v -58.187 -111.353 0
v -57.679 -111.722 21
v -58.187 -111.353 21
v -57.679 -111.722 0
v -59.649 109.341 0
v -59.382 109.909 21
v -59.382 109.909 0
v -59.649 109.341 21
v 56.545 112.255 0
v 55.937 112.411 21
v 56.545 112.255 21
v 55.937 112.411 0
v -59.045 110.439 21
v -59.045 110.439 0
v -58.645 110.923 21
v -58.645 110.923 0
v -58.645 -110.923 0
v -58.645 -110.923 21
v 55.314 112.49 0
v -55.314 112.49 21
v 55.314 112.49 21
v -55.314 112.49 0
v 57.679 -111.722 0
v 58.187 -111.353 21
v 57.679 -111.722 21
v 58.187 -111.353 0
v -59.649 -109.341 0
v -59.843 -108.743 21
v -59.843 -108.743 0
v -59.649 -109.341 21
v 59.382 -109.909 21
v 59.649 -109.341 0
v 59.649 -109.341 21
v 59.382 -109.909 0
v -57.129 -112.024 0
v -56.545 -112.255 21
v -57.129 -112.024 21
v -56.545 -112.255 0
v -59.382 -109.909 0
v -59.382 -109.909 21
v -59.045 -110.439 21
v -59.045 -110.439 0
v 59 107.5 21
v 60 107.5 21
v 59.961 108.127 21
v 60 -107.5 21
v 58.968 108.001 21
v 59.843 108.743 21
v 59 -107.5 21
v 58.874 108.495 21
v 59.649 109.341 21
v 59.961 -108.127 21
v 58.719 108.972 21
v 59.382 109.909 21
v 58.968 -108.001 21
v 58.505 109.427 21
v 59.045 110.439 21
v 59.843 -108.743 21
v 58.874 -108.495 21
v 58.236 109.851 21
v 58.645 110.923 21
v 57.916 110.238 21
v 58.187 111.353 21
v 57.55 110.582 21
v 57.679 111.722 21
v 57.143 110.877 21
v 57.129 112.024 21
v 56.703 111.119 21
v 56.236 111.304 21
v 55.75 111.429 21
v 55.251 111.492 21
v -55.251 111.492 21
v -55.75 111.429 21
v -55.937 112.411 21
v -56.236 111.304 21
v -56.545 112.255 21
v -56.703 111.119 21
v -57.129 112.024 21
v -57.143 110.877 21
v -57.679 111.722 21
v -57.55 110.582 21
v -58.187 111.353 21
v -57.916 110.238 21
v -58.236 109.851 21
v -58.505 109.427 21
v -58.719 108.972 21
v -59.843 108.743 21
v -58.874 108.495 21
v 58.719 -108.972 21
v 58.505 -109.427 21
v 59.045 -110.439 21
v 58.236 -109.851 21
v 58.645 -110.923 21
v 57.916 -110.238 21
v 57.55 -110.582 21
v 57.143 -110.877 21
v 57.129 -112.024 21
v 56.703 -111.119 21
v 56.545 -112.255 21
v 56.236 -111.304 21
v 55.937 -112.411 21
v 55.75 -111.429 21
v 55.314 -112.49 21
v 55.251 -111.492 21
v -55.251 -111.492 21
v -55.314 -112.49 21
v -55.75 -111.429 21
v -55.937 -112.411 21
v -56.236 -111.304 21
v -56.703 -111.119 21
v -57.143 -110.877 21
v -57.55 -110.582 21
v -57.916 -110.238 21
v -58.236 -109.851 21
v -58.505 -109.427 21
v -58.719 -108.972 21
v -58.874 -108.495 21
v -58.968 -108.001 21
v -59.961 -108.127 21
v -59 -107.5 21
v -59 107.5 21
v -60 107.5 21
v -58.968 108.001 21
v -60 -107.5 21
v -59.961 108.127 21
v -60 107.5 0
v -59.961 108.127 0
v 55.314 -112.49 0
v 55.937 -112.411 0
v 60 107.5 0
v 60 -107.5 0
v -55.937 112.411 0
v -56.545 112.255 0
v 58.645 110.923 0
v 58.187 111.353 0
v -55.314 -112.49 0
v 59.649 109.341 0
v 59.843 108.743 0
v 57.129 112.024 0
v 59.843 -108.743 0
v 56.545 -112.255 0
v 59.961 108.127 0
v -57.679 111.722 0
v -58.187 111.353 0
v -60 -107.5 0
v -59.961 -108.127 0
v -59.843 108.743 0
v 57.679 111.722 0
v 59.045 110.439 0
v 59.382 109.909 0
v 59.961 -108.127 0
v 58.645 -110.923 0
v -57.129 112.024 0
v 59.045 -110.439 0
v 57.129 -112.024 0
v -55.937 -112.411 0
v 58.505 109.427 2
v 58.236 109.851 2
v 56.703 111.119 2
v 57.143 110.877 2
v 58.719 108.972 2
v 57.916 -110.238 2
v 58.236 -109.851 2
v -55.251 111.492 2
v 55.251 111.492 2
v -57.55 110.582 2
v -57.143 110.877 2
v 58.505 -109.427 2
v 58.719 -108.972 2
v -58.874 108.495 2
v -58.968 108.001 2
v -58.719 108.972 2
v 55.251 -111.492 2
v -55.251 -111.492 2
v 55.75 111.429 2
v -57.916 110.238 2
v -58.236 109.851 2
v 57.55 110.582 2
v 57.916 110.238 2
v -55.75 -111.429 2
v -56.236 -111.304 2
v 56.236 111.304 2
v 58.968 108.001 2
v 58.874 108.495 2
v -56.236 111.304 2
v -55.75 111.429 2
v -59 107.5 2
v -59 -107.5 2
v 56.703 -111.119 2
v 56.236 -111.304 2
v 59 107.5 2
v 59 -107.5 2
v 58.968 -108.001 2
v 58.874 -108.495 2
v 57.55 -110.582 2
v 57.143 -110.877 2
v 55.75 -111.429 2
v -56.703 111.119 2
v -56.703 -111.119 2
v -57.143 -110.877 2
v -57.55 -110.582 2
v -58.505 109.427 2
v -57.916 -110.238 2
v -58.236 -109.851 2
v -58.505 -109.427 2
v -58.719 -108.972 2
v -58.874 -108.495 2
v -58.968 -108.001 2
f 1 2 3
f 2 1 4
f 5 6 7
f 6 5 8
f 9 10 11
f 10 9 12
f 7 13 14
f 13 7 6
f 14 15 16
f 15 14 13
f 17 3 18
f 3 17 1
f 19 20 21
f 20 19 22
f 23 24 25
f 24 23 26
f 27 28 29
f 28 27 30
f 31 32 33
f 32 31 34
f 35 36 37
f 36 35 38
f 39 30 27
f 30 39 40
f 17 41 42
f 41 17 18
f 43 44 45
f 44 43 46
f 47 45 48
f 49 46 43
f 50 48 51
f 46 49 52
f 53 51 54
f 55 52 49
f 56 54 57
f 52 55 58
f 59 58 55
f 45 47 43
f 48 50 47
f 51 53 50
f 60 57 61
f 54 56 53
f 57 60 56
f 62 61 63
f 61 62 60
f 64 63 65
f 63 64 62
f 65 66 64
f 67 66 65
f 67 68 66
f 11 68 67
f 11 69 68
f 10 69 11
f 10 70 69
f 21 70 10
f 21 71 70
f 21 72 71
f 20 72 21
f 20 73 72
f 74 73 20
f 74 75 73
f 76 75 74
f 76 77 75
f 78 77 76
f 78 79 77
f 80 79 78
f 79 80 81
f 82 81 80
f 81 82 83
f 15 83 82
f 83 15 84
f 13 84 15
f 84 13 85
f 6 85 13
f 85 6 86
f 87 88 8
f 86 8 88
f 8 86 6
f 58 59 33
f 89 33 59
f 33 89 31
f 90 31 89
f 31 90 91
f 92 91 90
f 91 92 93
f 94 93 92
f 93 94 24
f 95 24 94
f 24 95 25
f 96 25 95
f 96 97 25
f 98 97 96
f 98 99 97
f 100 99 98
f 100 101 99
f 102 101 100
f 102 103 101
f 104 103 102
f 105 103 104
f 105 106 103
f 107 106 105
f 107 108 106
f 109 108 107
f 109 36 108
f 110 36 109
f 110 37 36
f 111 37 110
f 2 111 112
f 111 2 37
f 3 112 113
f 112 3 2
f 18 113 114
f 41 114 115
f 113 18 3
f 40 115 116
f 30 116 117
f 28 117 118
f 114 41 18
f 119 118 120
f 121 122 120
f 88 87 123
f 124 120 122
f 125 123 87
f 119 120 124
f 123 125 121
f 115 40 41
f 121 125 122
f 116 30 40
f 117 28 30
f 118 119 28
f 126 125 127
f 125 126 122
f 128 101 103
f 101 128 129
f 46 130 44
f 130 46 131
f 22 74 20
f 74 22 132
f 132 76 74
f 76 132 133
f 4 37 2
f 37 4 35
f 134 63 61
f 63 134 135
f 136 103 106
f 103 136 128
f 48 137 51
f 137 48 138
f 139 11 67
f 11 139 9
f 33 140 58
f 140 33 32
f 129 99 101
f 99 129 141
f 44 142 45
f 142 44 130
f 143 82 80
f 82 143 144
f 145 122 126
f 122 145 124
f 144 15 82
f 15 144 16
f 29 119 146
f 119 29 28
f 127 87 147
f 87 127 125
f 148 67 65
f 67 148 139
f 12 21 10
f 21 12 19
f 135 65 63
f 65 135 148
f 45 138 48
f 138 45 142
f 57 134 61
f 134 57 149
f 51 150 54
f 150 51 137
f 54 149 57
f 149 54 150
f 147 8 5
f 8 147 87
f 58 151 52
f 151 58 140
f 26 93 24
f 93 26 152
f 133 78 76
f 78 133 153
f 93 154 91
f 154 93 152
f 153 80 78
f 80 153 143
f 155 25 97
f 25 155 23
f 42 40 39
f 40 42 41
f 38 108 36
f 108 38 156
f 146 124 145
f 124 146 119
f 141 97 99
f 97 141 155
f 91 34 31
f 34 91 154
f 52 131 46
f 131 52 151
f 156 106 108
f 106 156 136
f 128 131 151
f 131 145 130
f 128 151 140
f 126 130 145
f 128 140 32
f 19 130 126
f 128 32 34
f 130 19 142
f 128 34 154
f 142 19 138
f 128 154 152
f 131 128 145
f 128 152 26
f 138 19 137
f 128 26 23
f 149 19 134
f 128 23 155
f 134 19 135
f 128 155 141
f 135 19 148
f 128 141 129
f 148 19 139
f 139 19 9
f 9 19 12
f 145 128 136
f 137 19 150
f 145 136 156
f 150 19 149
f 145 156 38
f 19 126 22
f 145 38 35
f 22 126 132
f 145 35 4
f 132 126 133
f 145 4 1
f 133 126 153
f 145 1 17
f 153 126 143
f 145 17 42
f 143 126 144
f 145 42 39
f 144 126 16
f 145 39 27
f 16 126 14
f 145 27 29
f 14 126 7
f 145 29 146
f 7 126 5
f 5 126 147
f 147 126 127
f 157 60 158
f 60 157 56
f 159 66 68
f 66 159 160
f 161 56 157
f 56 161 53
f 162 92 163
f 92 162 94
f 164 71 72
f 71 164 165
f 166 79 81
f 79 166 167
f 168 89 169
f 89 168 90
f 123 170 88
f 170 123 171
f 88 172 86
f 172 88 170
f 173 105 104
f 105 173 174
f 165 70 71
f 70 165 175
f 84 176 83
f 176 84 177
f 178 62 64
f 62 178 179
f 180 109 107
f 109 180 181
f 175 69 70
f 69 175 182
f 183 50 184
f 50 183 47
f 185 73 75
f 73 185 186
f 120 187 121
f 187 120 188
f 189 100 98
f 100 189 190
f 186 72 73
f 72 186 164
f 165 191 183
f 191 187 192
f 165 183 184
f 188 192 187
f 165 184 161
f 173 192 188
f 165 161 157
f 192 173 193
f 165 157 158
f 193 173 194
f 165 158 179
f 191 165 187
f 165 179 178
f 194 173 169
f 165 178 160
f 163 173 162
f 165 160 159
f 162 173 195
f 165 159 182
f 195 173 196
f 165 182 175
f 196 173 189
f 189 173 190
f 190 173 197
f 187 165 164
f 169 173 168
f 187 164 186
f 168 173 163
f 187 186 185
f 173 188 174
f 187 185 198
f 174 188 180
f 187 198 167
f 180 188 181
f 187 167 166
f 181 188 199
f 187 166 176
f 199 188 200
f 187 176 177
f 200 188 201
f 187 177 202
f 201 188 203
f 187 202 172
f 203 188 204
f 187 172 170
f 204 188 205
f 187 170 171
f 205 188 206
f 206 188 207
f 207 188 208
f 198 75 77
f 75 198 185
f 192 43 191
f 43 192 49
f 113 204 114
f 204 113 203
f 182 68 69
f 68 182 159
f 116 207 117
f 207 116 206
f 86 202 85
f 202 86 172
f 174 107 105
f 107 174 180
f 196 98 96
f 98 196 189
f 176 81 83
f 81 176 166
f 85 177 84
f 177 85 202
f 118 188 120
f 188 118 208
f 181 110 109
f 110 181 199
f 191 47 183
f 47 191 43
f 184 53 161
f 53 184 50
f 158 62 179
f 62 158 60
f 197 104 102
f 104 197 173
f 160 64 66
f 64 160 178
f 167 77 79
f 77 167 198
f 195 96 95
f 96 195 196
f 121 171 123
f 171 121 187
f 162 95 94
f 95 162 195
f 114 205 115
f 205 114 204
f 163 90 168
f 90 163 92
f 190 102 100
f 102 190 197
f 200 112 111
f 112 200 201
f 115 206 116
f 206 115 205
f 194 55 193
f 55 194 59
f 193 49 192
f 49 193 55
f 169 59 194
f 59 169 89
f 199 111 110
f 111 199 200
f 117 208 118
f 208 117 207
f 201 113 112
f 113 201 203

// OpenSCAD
$fn = 50;


difference() {
	union() {
		hull() {
			translate(v = [-55.0000000000, 107.5000000000, 0]) {
				cylinder(h = 21, r = 5);
			}
			translate(v = [55.0000000000, 107.5000000000, 0]) {
				cylinder(h = 21, r = 5);
			}
			translate(v = [-55.0000000000, -107.5000000000, 0]) {
				cylinder(h = 21, r = 5);
			}
			translate(v = [55.0000000000, -107.5000000000, 0]) {
				cylinder(h = 21, r = 5);
			}
		}
	}
	union() {
		translate(v = [0, 0, 2]) {
			hull() {
				translate(v = [-55.0000000000, 107.5000000000, 0]) {
					cylinder(h = 19, r = 4);
				}
				translate(v = [55.0000000000, 107.5000000000, 0]) {
					cylinder(h = 19, r = 4);
				}
				translate(v = [-55.0000000000, -107.5000000000, 0]) {
					cylinder(h = 19, r = 4);
				}
				translate(v = [55.0000000000, -107.5000000000, 0]) {
					cylinder(h = 19, r = 4);
				}
			}
		}
	}
}
